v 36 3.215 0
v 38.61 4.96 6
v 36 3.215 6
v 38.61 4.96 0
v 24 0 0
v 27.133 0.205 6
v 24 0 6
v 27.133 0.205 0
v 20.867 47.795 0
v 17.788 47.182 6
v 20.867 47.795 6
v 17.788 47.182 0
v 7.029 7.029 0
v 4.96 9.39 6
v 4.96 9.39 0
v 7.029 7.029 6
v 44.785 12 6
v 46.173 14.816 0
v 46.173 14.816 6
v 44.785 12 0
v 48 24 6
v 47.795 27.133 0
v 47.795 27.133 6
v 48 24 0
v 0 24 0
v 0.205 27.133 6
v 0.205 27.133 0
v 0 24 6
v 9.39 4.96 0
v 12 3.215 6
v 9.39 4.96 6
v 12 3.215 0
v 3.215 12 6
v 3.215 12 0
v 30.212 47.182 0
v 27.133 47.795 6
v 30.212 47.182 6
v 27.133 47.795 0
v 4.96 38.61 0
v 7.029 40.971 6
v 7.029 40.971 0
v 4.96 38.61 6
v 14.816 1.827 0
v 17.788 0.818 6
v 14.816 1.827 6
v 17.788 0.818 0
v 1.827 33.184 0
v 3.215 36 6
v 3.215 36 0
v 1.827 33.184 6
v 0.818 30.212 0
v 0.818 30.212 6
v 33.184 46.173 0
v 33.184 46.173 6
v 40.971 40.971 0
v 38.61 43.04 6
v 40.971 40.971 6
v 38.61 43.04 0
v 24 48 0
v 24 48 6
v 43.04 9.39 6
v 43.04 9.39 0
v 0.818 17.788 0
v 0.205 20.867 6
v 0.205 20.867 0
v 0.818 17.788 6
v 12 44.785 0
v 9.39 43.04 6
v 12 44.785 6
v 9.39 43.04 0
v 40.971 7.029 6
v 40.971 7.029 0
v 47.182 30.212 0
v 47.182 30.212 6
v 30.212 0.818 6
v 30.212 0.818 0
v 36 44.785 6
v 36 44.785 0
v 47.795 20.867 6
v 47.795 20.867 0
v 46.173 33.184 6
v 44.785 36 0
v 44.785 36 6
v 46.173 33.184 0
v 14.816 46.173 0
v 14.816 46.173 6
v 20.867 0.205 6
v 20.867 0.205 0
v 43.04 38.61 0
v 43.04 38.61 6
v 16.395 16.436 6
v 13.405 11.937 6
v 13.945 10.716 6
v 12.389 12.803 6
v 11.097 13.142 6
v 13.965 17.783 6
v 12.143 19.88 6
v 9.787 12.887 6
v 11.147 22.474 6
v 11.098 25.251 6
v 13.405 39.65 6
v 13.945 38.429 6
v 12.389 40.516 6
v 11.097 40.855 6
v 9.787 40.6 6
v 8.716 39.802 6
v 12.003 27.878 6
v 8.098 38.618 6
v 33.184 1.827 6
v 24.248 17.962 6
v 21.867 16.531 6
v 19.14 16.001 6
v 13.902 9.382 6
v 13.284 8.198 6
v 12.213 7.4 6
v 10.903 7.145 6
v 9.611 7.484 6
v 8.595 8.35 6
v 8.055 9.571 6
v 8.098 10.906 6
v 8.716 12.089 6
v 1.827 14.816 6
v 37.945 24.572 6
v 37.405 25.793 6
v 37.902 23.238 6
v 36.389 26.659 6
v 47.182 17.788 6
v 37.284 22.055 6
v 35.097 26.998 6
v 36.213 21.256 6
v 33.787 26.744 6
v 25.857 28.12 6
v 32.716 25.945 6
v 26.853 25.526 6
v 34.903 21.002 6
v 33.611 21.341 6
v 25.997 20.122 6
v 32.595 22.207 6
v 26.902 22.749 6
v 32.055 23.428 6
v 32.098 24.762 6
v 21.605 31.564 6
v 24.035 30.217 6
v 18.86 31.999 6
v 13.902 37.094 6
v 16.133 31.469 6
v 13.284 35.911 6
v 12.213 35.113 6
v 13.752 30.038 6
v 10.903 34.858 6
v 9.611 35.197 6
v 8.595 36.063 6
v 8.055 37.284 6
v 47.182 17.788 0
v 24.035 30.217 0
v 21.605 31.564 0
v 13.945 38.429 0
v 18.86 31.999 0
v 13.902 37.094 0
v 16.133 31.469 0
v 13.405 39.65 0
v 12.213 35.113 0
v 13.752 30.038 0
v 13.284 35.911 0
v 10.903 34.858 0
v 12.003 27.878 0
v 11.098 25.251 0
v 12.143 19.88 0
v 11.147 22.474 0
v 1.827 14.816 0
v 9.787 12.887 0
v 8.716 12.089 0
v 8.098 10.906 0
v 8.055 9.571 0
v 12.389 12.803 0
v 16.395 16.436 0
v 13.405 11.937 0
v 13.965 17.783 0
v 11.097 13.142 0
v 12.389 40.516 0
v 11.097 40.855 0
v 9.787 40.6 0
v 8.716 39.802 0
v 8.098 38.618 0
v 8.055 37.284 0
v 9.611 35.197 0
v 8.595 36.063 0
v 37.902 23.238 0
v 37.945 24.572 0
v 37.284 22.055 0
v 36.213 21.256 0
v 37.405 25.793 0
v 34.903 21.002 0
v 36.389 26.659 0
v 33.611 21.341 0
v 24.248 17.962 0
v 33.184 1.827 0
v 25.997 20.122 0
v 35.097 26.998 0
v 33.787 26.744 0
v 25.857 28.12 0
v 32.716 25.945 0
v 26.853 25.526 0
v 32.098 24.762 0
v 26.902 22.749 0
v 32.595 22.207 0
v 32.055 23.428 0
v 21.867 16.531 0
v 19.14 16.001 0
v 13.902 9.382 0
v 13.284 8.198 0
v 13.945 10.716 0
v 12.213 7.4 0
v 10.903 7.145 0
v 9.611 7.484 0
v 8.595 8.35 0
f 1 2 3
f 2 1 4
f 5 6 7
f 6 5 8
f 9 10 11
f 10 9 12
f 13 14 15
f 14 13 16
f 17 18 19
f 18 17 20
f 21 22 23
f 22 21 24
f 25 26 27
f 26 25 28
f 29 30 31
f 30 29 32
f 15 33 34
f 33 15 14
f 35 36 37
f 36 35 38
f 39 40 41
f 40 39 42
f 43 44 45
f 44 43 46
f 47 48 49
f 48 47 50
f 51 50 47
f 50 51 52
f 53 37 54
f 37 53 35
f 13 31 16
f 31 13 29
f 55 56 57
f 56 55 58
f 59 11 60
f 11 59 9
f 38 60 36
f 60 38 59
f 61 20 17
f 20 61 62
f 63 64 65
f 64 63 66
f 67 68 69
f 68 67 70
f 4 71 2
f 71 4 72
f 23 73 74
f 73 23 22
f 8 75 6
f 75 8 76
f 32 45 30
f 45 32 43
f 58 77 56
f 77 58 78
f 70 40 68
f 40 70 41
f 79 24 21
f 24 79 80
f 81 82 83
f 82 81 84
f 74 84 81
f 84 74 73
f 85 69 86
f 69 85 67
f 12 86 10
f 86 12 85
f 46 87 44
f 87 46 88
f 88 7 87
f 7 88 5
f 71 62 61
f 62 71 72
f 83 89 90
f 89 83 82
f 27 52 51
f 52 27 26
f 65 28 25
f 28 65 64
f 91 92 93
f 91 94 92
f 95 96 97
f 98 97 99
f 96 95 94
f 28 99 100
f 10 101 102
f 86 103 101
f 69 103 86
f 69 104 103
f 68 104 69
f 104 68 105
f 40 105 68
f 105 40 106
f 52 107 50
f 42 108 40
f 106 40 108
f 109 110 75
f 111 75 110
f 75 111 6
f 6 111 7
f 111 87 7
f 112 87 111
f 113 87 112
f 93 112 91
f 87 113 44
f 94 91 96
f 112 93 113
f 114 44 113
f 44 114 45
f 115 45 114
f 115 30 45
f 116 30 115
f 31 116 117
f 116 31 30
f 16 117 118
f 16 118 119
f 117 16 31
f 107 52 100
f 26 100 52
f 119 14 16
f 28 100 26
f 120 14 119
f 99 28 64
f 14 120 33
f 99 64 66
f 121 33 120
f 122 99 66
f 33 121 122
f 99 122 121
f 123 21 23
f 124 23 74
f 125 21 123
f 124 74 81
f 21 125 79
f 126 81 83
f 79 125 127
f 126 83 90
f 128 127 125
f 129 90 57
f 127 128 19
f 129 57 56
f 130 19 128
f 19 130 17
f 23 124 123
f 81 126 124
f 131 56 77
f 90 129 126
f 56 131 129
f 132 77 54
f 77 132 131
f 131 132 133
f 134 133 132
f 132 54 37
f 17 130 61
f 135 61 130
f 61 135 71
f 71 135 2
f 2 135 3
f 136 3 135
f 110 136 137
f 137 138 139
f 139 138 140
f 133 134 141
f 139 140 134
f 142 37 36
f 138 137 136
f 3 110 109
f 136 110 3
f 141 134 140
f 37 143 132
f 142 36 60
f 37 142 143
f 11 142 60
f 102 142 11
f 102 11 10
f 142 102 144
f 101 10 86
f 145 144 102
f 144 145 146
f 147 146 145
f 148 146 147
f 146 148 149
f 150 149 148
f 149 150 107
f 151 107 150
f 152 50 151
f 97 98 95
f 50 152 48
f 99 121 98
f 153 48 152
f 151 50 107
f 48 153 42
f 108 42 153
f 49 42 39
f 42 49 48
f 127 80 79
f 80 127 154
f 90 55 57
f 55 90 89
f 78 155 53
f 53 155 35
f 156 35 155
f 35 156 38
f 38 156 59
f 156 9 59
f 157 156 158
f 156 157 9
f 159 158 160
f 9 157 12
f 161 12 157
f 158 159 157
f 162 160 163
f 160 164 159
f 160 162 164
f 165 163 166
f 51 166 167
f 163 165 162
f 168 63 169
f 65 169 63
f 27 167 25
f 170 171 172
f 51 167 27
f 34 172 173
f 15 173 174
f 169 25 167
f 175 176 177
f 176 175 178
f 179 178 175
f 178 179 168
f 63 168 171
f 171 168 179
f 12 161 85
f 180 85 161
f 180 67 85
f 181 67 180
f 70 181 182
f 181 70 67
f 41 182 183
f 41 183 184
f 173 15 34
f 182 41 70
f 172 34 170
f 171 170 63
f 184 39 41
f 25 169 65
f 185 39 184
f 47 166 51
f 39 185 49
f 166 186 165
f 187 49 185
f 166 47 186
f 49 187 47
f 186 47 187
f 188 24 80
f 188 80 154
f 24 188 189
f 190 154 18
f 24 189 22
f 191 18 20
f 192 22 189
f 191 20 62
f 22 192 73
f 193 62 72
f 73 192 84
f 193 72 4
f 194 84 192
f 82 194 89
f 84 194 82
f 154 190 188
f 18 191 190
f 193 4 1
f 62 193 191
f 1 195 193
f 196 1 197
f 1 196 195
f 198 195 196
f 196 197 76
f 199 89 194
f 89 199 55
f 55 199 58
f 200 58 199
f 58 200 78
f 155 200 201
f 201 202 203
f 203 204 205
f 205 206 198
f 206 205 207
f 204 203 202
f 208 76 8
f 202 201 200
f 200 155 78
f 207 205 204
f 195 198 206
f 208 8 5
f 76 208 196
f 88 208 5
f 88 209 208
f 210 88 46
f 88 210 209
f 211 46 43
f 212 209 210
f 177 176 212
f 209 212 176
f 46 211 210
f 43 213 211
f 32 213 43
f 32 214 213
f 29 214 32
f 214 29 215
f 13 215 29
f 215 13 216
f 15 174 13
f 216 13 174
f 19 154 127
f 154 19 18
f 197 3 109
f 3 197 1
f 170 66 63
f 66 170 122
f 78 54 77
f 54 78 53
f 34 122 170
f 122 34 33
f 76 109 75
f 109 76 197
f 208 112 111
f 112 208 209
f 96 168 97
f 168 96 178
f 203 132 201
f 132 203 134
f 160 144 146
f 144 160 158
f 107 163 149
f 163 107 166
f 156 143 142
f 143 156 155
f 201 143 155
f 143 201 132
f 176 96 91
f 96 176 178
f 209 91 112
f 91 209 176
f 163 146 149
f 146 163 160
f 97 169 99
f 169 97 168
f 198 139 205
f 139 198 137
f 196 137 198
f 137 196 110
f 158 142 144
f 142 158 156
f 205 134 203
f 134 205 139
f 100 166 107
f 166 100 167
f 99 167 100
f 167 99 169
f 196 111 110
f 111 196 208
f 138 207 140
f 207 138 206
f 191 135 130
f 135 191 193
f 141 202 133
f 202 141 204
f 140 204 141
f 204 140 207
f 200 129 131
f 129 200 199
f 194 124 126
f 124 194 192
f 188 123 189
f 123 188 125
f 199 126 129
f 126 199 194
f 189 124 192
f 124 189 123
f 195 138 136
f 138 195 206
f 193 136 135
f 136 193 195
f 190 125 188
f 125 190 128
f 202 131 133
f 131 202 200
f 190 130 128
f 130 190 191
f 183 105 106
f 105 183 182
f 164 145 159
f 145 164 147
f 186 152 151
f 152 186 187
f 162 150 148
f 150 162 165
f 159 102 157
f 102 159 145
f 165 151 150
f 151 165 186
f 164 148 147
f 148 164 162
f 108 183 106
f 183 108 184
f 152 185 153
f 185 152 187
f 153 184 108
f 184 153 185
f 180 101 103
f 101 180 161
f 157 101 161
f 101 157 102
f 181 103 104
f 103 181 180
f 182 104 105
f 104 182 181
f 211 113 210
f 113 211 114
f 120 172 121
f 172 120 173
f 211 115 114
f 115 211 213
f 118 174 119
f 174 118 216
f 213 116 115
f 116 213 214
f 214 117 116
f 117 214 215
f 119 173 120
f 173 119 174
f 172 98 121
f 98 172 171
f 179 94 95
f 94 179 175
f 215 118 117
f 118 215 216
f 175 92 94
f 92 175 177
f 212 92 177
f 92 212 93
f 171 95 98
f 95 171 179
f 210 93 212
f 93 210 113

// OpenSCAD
$fn = 32;

// ----------------------------------------------------------------------
// Cam plate: eccentric cam, base R24
// ----------------------------------------------------------------------

// --- parameters (mm) ---
base_r = 24;              // base circle radius
lobe_h = 12;              // cam lobe rise
bore_r = 8;               // shaft bore radius
plate_t = 6;              // plate thickness, Z (extrusion height)
ecc = 5;                  // disc eccentricity
ring_r = 16;              // lightening ring radius
bolt_r = 3;               // lightening hole radius

profile = [[48, 24], [47.795, 27.133], [47.182, 30.212], [46.173, 33.184], [44.785, 36], [43.04, 38.61], [40.971, 40.971], [38.61, 43.04], [36, 44.785], [33.184, 46.173], [30.212, 47.182], [27.133, 47.795], [24, 48], [20.867, 47.795], [17.788, 47.182], [14.816, 46.173], [12, 44.785], [9.39, 43.04], [7.029, 40.971], [4.96, 38.61], [3.215, 36], [1.827, 33.184], [0.818, 30.212], [0.205, 27.133], [0, 24], [0.205, 20.867], [0.818, 17.788], [1.827, 14.816], [3.215, 12], [4.96, 9.39], [7.029, 7.029], [9.39, 4.96], [12, 3.215], [14.816, 1.827], [17.788, 0.818], [20.867, 0.205], [24, 0], [27.133, 0.205], [30.212, 0.818], [33.184, 1.827], [36, 3.215], [38.61, 4.96], [40.971, 7.029], [43.04, 9.39], [44.785, 12], [46.173, 14.816], [47.182, 17.788], [47.795, 20.867]];  // primary outline, 48 points, counter clockwise
void_1 = [[26.853, 25.526], [25.857, 28.12], [24.035, 30.217], [21.605, 31.564], [18.86, 31.999], [16.133, 31.469], [13.752, 30.038], [12.003, 27.878], [11.098, 25.251], [11.147, 22.474], [12.143, 19.88], [13.965, 17.783], [16.395, 16.436], [19.14, 16.001], [21.867, 16.531], [24.248, 17.962], [25.997, 20.122], [26.902, 22.749]];  // shaft bore, 18 points
void_2 = [[37.945, 24.572], [37.405, 25.793], [36.389, 26.659], [35.097, 26.998], [33.787, 26.744], [32.716, 25.945], [32.098, 24.762], [32.055, 23.428], [32.595, 22.207], [33.611, 21.341], [34.903, 21.002], [36.213, 21.256], [37.284, 22.055], [37.902, 23.238]];  // lightening hole 1, 14 points
void_3 = [[13.945, 38.429], [13.405, 39.65], [12.389, 40.516], [11.097, 40.855], [9.787, 40.6], [8.716, 39.802], [8.098, 38.618], [8.055, 37.284], [8.595, 36.063], [9.611, 35.197], [10.903, 34.858], [12.213, 35.113], [13.284, 35.911], [13.902, 37.094]];  // lightening hole 2, 14 points
void_4 = [[13.945, 10.716], [13.405, 11.937], [12.389, 12.803], [11.097, 13.142], [9.787, 12.887], [8.716, 12.089], [8.098, 10.906], [8.055, 9.571], [8.595, 8.35], [9.611, 7.484], [10.903, 7.145], [12.213, 7.4], [13.284, 8.198], [13.902, 9.382]];  // lightening hole 3, 14 points

// --- the one profile operation ---
difference() {
  linear_extrude(height = plate_t) polygon(points = profile);
  translate([0, 0, -1])
    linear_extrude(height = plate_t + 2) polygon(points = void_1);
  translate([0, 0, -1])
    linear_extrude(height = plate_t + 2) polygon(points = void_2);
  translate([0, 0, -1])
    linear_extrude(height = plate_t + 2) polygon(points = void_3);
  translate([0, 0, -1])
    linear_extrude(height = plate_t + 2) polygon(points = void_4);
}
